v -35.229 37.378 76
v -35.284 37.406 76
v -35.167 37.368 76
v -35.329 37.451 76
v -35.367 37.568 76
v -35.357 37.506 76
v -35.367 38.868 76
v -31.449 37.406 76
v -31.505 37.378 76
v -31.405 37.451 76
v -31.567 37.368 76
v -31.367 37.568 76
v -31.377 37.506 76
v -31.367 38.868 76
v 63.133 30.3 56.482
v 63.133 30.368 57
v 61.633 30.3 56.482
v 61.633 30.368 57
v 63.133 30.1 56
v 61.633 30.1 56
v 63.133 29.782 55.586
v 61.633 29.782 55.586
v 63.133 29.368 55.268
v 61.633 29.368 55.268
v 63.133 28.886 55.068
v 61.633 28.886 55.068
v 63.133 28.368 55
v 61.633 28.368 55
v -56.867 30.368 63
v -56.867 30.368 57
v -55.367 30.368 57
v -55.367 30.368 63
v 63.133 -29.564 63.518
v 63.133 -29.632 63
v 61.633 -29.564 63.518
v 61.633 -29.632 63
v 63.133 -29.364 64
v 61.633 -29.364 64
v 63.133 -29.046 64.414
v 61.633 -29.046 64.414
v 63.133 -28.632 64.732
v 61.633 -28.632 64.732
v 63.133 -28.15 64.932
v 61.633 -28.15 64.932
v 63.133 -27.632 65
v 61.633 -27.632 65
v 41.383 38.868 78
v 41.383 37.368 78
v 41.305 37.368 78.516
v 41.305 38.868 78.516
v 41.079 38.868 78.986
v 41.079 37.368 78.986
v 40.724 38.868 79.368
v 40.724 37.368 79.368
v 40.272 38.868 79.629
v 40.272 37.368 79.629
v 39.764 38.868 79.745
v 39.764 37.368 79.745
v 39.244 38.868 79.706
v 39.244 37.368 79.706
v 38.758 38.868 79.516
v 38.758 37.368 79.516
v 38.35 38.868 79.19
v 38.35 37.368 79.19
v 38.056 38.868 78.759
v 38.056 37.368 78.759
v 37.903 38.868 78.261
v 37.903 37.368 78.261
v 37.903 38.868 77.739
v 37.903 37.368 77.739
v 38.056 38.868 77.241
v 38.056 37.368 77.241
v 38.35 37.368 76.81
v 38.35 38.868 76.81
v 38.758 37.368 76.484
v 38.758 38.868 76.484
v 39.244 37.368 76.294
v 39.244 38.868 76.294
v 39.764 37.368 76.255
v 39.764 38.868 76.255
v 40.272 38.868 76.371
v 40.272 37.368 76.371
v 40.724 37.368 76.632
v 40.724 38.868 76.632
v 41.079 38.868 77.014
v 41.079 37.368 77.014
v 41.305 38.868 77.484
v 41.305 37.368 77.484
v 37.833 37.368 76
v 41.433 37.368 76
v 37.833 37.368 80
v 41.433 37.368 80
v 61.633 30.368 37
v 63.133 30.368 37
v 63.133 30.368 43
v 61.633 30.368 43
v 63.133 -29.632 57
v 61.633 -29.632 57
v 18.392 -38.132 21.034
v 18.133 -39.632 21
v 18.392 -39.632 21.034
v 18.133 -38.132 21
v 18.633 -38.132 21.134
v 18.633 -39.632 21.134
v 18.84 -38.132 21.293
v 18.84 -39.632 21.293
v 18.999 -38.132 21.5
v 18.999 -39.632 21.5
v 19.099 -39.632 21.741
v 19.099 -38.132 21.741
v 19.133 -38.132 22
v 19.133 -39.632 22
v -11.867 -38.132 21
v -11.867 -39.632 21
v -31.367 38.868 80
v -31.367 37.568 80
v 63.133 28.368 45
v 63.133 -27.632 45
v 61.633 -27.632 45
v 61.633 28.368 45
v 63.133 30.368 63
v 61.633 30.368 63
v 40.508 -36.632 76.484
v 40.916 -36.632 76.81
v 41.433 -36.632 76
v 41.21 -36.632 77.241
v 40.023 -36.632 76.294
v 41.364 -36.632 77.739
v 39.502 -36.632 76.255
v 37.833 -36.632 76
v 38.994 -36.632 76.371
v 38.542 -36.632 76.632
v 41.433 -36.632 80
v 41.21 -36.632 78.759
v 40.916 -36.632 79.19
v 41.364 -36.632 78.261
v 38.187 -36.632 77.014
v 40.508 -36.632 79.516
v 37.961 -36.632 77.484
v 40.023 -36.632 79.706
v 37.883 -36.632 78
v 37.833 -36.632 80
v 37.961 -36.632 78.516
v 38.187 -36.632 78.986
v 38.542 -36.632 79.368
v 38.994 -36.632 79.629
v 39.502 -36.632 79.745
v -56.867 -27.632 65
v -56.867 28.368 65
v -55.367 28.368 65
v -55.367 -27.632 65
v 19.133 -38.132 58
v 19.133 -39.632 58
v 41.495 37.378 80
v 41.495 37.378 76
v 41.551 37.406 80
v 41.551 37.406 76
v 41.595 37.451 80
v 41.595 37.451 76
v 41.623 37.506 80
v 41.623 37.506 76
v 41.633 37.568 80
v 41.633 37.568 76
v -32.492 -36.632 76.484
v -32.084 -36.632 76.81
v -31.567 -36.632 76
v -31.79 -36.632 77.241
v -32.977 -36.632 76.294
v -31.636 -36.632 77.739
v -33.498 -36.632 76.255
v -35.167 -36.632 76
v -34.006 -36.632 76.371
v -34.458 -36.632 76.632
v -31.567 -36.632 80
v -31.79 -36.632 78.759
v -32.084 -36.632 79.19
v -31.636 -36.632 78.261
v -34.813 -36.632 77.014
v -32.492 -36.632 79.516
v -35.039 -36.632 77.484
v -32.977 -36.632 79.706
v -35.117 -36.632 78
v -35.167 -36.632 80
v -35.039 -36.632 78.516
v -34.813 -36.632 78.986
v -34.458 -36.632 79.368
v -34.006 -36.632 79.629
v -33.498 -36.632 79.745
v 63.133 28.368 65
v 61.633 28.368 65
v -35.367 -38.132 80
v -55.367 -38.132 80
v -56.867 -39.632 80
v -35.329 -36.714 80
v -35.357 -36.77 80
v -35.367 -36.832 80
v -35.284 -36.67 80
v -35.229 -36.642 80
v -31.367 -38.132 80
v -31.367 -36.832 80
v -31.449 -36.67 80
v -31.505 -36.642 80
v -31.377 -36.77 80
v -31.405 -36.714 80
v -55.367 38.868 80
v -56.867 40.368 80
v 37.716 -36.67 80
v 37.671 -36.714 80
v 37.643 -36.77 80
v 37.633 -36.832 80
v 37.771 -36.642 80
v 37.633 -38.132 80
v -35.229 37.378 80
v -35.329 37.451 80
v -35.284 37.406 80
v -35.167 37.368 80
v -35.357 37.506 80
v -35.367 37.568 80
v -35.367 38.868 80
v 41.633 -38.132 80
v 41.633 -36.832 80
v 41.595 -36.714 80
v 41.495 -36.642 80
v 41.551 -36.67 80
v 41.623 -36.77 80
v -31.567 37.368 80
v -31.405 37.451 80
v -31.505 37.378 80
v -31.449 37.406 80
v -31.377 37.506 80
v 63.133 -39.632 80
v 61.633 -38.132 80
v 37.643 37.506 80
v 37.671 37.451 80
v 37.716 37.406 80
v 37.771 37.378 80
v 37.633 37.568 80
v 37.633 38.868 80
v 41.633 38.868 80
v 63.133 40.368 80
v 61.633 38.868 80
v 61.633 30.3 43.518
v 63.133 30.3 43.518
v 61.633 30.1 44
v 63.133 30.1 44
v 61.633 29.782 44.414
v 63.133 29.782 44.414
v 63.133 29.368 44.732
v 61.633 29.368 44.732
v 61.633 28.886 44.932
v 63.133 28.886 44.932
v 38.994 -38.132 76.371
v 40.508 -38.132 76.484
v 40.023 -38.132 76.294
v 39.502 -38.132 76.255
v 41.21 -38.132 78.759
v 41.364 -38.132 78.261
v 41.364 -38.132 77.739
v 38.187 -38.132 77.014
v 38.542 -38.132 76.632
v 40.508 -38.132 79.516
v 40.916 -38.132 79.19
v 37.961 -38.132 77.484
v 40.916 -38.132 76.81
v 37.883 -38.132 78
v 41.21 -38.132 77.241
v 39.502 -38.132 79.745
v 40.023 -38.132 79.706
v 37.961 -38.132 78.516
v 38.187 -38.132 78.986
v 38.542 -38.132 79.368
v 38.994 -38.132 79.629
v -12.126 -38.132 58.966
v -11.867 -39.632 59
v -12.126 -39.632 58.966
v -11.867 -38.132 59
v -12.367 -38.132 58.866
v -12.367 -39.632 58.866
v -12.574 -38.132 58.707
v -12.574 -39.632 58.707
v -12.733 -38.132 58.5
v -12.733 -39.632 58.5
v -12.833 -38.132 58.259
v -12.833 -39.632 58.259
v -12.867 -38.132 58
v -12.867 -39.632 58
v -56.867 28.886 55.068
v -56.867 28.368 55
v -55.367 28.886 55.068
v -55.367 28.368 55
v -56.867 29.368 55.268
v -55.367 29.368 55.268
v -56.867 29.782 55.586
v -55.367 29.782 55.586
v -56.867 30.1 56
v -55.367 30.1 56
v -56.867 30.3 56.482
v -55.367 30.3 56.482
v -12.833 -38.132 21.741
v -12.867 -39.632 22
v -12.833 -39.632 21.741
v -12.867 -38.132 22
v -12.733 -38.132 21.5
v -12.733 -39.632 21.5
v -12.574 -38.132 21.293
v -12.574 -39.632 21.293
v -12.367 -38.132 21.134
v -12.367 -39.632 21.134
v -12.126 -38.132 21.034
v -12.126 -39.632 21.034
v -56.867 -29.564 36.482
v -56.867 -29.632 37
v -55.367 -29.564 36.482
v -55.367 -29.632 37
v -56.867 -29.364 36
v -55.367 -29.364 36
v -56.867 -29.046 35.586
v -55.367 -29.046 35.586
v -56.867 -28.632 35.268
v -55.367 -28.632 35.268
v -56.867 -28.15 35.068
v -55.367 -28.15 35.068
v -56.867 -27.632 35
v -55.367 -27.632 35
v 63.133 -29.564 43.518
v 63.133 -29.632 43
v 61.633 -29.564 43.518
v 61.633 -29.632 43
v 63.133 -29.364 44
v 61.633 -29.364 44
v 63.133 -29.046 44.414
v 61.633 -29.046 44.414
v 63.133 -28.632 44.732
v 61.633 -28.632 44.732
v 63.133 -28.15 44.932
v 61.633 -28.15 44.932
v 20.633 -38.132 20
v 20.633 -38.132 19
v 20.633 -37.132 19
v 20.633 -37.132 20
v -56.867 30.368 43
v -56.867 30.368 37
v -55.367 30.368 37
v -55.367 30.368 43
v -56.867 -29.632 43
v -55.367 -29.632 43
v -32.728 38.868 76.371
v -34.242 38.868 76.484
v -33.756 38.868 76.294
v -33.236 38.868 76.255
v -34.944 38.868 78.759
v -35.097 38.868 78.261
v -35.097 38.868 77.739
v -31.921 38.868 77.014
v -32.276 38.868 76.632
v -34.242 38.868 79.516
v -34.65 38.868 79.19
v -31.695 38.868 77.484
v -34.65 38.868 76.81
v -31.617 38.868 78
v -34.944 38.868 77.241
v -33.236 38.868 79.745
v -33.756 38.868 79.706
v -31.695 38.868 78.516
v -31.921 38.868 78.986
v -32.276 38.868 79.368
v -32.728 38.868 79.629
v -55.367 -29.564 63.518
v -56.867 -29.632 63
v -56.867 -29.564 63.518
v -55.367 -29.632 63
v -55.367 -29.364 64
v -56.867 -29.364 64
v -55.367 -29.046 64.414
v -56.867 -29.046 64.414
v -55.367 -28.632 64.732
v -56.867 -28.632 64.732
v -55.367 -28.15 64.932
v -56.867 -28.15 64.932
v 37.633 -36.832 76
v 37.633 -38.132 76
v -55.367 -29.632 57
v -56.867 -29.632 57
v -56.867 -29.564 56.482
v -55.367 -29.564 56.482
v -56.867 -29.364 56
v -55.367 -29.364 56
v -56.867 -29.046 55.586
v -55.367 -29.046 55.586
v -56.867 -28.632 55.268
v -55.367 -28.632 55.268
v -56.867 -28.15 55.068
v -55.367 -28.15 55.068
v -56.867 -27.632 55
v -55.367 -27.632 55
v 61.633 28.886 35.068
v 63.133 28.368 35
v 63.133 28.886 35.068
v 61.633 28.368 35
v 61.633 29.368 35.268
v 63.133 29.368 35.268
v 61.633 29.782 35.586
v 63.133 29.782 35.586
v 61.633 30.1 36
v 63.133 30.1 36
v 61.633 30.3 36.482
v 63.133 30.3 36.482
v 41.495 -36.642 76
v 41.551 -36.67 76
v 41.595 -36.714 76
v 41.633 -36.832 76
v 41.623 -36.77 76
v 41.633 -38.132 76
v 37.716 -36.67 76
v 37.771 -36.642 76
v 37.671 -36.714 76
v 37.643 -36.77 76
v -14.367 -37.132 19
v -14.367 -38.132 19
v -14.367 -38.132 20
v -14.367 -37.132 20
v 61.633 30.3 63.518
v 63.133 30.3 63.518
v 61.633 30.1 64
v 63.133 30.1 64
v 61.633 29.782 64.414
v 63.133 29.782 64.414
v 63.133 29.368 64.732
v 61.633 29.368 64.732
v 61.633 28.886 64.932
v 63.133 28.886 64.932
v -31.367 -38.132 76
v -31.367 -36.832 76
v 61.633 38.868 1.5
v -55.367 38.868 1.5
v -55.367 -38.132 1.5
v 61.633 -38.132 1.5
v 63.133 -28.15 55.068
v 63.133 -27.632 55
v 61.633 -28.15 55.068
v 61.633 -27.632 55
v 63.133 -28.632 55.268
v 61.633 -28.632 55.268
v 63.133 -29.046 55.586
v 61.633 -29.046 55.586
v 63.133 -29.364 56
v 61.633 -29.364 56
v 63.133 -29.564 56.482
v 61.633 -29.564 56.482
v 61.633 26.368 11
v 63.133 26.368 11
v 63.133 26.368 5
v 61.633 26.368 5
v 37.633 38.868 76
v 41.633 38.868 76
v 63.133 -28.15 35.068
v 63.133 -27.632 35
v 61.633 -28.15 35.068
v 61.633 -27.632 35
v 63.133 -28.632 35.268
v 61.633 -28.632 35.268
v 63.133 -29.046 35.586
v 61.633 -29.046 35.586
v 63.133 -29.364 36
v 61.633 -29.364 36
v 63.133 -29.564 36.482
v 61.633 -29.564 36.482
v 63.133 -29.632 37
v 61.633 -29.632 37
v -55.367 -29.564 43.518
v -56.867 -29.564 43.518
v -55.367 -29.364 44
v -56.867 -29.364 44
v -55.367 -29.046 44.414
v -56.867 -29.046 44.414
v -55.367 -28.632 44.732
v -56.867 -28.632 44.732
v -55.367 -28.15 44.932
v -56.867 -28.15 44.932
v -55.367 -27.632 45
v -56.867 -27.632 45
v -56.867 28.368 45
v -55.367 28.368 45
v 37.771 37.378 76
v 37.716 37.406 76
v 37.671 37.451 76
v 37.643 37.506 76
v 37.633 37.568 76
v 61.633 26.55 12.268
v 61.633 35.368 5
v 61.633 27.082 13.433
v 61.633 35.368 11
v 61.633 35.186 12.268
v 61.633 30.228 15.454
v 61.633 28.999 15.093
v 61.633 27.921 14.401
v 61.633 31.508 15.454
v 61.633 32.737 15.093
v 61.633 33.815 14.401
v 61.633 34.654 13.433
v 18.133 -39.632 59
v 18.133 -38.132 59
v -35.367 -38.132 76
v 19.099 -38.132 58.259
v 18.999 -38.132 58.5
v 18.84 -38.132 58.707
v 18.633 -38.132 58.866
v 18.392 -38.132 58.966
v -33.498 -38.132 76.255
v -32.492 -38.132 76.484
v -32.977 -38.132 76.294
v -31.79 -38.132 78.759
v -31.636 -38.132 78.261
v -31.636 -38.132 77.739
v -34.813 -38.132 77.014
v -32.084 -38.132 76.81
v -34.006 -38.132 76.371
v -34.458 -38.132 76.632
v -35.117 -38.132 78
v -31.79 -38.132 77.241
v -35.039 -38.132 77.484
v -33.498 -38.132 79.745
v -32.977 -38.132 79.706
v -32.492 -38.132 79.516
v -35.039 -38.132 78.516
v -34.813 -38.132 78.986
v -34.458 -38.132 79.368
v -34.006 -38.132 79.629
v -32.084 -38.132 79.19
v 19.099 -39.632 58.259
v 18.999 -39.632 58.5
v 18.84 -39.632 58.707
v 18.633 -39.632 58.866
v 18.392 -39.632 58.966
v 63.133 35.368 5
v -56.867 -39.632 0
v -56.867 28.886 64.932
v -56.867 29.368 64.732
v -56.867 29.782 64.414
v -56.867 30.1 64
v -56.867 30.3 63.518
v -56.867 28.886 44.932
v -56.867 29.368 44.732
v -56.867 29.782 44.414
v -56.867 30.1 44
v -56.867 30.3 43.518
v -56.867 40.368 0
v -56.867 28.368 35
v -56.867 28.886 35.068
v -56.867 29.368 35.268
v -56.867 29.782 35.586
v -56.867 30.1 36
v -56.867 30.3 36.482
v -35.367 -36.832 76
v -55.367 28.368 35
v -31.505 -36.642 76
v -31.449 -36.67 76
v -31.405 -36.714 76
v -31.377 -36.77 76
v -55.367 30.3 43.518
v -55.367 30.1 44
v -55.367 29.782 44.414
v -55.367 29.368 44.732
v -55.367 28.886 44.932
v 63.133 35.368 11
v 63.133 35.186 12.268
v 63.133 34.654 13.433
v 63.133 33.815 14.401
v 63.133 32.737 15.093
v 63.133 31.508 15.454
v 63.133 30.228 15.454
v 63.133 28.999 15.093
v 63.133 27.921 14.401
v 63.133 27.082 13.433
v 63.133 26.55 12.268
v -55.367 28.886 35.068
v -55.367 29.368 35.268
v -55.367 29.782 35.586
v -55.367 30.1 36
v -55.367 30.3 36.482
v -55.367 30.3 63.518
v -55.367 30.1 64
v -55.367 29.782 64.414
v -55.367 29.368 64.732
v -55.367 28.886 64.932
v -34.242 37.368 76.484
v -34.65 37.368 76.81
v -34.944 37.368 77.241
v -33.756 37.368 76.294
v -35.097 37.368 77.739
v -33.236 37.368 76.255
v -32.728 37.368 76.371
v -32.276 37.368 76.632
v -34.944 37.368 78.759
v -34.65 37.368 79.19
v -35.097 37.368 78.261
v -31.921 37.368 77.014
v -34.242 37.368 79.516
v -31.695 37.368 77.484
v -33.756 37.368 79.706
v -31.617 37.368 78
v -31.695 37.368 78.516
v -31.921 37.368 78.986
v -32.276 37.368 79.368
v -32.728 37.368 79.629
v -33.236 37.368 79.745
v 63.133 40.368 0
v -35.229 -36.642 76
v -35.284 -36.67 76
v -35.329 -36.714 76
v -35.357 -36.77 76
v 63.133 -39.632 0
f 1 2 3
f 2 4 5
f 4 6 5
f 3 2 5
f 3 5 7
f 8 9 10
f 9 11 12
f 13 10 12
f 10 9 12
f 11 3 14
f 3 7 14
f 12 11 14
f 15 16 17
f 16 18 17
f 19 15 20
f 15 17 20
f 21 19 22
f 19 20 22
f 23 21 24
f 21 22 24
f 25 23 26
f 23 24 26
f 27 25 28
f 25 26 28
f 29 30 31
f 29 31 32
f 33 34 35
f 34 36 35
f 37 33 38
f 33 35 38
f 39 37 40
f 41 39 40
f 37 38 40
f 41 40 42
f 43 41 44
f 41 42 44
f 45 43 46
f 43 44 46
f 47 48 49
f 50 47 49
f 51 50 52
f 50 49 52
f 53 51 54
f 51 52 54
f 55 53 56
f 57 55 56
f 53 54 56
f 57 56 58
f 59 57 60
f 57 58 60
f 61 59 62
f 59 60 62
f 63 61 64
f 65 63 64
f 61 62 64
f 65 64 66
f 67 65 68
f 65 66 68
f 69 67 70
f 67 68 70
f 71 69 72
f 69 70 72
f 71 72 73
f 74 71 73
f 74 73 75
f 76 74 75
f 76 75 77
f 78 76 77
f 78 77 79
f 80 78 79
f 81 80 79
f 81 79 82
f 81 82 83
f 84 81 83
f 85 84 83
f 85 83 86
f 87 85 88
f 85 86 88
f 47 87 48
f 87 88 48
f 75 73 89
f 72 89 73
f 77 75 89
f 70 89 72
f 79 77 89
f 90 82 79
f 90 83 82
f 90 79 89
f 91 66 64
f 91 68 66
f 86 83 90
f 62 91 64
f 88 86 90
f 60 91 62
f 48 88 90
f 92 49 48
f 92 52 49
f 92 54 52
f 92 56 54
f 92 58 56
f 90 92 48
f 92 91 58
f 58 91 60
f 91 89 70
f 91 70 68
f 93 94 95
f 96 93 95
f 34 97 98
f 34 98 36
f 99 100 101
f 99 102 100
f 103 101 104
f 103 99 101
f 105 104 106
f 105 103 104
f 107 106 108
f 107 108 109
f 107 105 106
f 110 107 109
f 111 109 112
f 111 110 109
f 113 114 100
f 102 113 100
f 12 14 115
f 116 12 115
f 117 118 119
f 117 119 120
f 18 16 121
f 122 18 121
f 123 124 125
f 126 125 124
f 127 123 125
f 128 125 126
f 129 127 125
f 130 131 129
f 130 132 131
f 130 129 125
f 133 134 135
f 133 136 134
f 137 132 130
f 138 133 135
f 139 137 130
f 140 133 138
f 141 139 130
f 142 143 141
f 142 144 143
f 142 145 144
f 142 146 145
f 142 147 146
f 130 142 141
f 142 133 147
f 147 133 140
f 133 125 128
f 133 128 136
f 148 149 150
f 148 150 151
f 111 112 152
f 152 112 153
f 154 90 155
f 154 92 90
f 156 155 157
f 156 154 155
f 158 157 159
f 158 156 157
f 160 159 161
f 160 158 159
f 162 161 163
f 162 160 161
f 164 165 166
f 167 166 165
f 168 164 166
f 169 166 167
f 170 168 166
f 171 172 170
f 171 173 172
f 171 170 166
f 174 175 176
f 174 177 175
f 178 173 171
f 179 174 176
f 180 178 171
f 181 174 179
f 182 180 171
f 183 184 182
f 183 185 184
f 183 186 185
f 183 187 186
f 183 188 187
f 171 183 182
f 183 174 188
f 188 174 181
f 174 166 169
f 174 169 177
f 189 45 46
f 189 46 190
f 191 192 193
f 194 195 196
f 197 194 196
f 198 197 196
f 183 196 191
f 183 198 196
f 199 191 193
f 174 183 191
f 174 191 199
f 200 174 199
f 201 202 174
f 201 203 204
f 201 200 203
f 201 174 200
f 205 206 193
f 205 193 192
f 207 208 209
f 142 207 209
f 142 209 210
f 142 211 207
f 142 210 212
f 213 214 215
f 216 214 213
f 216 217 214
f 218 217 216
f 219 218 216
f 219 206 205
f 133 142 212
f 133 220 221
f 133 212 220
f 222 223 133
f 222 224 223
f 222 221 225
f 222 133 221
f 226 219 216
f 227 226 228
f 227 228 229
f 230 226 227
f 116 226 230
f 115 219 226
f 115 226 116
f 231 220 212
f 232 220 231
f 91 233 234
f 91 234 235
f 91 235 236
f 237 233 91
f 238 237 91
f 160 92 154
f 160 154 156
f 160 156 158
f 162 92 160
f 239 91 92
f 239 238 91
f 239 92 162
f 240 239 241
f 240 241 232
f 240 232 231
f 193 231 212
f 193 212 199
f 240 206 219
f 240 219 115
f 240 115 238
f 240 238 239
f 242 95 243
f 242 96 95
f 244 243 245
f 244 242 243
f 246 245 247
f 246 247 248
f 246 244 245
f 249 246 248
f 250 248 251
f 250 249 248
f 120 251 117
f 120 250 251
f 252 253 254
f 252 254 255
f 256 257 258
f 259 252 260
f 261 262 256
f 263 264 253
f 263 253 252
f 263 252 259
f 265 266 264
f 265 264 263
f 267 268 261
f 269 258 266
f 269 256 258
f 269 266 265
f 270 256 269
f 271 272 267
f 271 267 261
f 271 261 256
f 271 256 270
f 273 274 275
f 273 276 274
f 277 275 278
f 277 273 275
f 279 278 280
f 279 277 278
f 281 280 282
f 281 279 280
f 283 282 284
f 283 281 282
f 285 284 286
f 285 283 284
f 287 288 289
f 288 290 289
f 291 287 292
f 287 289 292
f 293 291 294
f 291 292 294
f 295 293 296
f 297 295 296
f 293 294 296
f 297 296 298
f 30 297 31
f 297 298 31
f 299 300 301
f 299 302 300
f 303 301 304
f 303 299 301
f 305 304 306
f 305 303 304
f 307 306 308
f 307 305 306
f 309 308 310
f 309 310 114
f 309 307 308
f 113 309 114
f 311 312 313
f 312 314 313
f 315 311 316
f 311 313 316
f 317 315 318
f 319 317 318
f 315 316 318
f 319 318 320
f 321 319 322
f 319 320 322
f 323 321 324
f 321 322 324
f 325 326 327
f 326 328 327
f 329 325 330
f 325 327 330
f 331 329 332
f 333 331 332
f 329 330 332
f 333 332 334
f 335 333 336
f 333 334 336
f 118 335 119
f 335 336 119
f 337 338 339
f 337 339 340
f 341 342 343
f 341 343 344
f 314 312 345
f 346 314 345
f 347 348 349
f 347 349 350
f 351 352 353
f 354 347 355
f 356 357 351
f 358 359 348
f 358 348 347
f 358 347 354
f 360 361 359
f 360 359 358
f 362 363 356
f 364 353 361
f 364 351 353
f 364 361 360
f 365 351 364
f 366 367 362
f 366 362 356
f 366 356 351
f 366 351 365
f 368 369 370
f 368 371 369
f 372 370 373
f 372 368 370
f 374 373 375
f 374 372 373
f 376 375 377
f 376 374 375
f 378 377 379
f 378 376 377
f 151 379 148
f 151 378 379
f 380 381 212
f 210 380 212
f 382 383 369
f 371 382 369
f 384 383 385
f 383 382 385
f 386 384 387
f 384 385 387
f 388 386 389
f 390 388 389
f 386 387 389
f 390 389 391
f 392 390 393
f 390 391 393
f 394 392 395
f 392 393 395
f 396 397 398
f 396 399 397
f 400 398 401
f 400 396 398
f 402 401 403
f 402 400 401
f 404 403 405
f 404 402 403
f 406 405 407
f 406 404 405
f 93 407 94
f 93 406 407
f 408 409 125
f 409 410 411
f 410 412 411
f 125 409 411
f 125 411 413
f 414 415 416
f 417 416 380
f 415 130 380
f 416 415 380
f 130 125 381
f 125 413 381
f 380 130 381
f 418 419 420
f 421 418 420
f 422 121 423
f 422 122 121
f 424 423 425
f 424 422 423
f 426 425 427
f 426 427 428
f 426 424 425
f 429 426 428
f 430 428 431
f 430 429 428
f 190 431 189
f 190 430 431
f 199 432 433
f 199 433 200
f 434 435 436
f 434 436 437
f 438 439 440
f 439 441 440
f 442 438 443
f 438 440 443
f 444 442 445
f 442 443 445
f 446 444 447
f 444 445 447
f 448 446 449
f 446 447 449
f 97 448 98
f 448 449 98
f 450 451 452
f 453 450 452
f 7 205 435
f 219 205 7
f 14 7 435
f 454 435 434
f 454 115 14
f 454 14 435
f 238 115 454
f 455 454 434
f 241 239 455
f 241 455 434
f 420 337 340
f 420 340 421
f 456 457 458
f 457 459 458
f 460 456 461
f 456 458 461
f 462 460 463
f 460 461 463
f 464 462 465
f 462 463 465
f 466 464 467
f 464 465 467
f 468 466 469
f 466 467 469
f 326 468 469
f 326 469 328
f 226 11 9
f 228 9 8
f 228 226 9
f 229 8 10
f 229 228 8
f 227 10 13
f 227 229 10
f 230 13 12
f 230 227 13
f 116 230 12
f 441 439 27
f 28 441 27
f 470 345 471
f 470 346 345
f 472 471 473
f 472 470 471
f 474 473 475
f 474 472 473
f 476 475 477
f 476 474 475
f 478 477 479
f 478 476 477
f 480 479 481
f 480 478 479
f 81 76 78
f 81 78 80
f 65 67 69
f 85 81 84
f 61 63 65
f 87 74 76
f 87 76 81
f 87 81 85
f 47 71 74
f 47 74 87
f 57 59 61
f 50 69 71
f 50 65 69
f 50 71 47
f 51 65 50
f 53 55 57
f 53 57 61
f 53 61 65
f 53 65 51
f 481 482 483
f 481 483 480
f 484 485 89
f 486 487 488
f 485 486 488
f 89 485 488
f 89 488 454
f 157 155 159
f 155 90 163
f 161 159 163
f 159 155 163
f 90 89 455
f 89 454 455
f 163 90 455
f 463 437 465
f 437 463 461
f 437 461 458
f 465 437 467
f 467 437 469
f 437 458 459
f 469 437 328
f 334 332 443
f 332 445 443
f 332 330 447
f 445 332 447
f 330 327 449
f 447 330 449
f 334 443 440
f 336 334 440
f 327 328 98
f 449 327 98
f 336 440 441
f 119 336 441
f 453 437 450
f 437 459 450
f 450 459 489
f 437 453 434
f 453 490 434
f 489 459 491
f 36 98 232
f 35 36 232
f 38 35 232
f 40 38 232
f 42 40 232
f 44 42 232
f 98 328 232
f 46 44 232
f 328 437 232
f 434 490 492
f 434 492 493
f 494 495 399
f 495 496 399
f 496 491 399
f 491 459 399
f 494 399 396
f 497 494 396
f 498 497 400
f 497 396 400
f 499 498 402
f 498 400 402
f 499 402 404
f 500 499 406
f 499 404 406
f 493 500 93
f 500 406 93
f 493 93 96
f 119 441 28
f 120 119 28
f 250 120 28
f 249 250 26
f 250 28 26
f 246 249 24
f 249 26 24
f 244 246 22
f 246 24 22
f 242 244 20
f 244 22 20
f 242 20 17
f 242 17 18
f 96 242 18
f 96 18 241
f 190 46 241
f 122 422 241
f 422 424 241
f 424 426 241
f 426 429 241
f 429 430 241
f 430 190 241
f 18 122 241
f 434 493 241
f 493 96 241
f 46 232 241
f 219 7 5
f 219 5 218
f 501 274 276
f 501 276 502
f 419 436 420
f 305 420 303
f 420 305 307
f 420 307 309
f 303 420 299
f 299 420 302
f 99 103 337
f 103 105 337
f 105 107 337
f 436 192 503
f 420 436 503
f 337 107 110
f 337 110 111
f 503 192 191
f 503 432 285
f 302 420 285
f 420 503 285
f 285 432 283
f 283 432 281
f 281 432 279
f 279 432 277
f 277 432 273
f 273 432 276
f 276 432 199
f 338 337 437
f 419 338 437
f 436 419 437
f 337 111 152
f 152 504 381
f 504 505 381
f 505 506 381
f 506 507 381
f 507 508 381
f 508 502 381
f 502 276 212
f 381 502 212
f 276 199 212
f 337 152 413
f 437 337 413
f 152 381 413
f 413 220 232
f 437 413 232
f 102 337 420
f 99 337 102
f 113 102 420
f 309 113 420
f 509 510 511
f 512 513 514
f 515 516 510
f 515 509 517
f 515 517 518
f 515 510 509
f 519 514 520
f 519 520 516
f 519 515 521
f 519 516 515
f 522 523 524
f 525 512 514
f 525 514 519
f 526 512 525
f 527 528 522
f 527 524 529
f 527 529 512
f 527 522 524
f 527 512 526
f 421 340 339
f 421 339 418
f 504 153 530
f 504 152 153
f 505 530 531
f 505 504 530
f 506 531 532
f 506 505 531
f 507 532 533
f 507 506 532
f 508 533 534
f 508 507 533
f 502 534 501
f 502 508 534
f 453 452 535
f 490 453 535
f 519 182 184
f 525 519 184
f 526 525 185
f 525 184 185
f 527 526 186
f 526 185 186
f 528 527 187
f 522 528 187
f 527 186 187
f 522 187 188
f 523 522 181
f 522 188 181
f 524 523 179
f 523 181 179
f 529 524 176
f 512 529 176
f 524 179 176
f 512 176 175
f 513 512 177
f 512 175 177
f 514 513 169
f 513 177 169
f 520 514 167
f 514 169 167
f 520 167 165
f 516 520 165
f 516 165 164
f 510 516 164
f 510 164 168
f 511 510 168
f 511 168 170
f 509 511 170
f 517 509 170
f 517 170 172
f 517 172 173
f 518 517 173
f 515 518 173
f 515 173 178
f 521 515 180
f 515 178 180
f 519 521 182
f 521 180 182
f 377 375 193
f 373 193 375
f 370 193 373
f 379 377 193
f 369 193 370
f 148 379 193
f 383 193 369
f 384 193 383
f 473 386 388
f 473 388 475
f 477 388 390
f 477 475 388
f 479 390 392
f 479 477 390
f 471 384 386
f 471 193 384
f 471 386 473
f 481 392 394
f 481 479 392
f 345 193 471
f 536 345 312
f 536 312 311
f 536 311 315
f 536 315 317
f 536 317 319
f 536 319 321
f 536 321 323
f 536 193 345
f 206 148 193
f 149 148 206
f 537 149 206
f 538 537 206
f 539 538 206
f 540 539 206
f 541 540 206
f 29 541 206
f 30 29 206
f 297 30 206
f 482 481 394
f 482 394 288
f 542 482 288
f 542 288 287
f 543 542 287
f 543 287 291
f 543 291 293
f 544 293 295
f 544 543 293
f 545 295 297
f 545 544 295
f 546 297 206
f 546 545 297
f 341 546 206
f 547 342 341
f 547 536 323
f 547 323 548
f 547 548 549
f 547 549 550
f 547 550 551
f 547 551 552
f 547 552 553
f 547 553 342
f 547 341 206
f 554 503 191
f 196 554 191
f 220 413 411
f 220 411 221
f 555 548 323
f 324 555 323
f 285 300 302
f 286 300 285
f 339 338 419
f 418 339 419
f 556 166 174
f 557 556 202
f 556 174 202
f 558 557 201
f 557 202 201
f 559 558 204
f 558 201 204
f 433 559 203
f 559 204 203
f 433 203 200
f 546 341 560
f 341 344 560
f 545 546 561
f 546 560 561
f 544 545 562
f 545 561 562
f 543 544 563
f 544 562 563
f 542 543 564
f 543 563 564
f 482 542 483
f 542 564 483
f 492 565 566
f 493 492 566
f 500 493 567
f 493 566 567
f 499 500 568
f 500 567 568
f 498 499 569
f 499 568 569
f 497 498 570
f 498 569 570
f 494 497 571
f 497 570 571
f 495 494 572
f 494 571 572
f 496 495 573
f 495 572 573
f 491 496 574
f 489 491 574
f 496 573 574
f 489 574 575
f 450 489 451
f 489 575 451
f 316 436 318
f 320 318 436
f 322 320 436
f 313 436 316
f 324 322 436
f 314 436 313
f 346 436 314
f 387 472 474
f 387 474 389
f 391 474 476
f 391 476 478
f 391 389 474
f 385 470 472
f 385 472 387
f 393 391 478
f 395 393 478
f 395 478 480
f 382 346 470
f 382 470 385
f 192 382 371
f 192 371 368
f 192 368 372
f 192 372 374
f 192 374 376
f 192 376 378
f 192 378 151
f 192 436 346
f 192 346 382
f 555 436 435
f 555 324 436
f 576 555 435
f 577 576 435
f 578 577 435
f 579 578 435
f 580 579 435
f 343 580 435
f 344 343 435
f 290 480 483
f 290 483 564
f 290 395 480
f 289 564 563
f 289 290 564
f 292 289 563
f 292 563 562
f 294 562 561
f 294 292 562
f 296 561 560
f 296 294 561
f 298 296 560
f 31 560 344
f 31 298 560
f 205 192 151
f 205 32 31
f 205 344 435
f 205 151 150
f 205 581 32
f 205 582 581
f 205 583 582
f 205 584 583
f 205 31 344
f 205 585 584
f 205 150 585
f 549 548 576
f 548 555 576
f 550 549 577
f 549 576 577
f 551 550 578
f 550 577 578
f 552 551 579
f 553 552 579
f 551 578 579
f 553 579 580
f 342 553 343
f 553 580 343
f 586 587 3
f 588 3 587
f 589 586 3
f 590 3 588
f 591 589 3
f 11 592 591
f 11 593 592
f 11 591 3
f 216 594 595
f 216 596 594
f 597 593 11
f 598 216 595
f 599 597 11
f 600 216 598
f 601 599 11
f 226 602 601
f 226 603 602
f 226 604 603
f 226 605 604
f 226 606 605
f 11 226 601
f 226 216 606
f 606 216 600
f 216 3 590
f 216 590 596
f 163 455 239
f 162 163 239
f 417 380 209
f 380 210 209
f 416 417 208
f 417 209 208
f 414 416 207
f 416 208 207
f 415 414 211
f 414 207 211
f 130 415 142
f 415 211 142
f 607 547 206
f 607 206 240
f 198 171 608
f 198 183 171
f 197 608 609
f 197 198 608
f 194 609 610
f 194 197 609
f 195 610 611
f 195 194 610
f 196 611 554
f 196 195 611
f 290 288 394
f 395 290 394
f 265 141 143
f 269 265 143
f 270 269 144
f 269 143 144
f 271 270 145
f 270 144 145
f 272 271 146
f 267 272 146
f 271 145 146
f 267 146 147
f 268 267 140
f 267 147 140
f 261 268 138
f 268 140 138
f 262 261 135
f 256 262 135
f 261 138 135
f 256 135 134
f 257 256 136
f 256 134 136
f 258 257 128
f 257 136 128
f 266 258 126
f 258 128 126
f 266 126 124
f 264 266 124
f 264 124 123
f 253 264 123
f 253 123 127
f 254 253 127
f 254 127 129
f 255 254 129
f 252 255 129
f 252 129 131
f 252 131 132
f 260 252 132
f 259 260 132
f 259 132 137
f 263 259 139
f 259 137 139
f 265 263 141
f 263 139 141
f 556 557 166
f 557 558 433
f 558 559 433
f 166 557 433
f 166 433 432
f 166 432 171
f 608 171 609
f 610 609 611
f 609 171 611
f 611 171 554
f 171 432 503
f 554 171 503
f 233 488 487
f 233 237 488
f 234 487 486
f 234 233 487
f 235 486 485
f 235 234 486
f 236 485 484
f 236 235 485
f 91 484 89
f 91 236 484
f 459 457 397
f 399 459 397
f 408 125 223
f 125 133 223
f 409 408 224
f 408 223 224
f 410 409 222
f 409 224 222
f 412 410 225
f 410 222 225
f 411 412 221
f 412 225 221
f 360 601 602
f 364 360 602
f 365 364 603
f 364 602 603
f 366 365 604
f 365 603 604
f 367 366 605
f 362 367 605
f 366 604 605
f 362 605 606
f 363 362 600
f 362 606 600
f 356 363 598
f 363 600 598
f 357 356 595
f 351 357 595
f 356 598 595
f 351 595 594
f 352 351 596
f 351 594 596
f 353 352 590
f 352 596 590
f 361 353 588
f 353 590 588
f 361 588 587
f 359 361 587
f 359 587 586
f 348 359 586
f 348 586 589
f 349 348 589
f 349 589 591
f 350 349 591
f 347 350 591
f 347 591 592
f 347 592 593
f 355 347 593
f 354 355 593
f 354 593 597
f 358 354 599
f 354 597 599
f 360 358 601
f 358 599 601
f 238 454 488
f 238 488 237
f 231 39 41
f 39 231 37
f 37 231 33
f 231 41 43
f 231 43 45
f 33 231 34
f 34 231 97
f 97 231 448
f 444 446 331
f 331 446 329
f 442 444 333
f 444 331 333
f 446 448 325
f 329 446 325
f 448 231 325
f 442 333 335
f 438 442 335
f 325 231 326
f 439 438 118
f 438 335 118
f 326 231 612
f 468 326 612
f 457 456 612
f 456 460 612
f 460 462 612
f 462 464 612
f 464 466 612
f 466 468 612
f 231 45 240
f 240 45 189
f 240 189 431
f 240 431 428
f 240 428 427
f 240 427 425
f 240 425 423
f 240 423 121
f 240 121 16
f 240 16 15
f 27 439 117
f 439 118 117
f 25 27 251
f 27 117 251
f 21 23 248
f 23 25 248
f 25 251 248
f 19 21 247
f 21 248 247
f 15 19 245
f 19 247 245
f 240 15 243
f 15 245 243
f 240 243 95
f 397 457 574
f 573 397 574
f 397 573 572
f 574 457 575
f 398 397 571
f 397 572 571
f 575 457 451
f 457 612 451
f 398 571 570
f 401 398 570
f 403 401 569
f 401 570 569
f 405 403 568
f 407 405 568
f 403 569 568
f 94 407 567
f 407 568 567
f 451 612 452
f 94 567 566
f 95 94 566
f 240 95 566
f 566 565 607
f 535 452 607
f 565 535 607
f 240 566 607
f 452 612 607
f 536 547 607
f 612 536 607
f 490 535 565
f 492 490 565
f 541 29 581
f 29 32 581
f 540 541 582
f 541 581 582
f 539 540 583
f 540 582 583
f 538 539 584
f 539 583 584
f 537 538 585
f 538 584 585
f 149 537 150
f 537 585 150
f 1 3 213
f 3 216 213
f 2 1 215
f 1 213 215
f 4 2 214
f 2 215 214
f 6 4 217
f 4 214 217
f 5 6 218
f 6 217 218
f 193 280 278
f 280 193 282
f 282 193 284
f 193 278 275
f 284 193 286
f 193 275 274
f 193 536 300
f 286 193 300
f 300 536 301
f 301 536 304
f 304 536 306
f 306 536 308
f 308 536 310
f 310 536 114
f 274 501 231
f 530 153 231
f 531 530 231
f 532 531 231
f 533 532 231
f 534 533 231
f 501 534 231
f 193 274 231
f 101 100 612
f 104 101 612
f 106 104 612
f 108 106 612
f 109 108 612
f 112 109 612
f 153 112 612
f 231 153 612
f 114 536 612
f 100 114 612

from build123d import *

# Parameters (mm, degrees)
SKETCH_W        = 120
SKETCH_H        = 80
PAD_DEPTH       = 80
SKETCH001_W     = 117
SKETCH001_H     = 77
POCKET_DEPTH    = 78.5
SKETCH002_W     = 32
SKETCH002_H     = 38
POCKET001_DEPTH = 2
SKETCH003_W     = 60
SKETCH003_H     = 10
POCKET002_DEPTH = 5
SKETCH004_W     = 60
SKETCH004_H     = 10
POCKET003_DEPTH = 5
POCKET004_DEPTH = 5
SKETCH006_W     = 4
SKETCH006_H     = 4
PAD001_DEPTH    = 1.5
SKETCH007_R     = 1.75
POCKET005_DEPTH = 1.5
SKETCH008_R     = 1.75
POCKET006_DEPTH = 1.5
SKETCH009_W     = 4
SKETCH009_H     = 4
PAD002_DEPTH    = 1.5
SKETCH010_R     = 1.75
POCKET007_DEPTH = 1.5
SKETCH011_R     = 1.75
POCKET008_DEPTH = 1.5
FILLET_R        = 1
FILLET001_R     = 1
FILLET002_R     = 1
FILLET003_R     = 1
SKETCH012_W     = 35
SKETCH012_H     = 1
PAD003_DEPTH    = 1
FILLET004_R     = 0.2
FILLET005_R     = 0.2
FILLET006_R     = 0.2
FILLET007_R     = 0.2
FILLET008_R     = 0.2
FILLET009_R     = 0.2
FILLET010_R     = 0.2
FILLET011_R     = 0.2
FILLET012_R     = 2
FILLET013_R     = 2
FILLET014_R     = 2
FILLET015_R     = 2
FILLET016_R     = 2
FILLET017_R     = 2
FILLET018_R     = 2
FILLET019_R     = 2
FILLET020_R     = 2
FILLET021_R     = 2
FILLET022_R     = 2
FILLET023_R     = 2
FILLET024_R     = 2
FILLET025_R     = 2
FILLET026_R     = 2
FILLET027_R     = 2


with BuildPart() as part:
    # Sketch → Pad (new body)
    with BuildSketch(Plane.XY):
        with Locations((3.133141, 0.368083)):
            Rectangle(SKETCH_W, SKETCH_H)
    extrude(amount=PAD_DEPTH)

    # Sketch001 (on Face6 of Pad) → Pocket (cut)
    with BuildSketch(Plane.XY.offset(80)):
        with Locations((3.133141, 0.368083)):
            Rectangle(SKETCH001_W, SKETCH001_H)
    extrude(amount=-POCKET_DEPTH, mode=Mode.SUBTRACT)

    # Sketch002 (on Face6 of Pocket) → Pocket001 (cut)
    with BuildSketch(Plane.XZ.offset(39.631917)):
        with Locations((3.133141, 40)):
            Rectangle(SKETCH002_W, SKETCH002_H)
    extrude(amount=-POCKET001_DEPTH, mode=Mode.SUBTRACT)

    # Sketch003 (on Face3 of Pocket001) → Pocket002 (cut)
    with BuildSketch(Plane.YZ.offset(63.133141)):
        with Locations((0.368083, 60)):
            Rectangle(SKETCH003_W, SKETCH003_H)
        with Locations((0.368083, 40)):
            Rectangle(SKETCH003_W, SKETCH003_H)
    extrude(amount=-POCKET002_DEPTH, mode=Mode.SUBTRACT)

    # Sketch004 (on Face2 of Pocket002) → Pocket003 (cut)
    with BuildSketch(Plane(origin=(-56.866859, 0, 0), x_dir=(0, -1, 0), z_dir=(-1, 0, 0))):
        with Locations((-0.368083, 60)):
            Rectangle(SKETCH004_W, SKETCH004_H)
        with Locations((-0.368083, 40)):
            Rectangle(SKETCH004_W, SKETCH004_H)
    extrude(amount=-POCKET003_DEPTH, mode=Mode.SUBTRACT)

    # Sketch005 (on Face3 of Pocket003) → Pocket004 (cut)
    with BuildSketch(Plane.YZ.offset(63.133141)):
        with BuildLine():
            Line((26.368083, 11), (26.368083, 5))
            Line((26.368083, 5), (35.368083, 5))
            Line((35.368083, 5), (35.368083, 11))
            ThreePointArc((35.368083, 11), (30.868083, 15.5), (26.368083, 11))
        make_face()
    extrude(amount=-POCKET004_DEPTH, mode=Mode.SUBTRACT)

    # Sketch006 (on Face27 of Pocket004) → Pad001 (join)
    with BuildSketch(Plane.XZ.offset(-38.868083)):
        with Locations((-33.366859, 78)):
            Rectangle(SKETCH006_W, SKETCH006_H)
        with Locations((39.633141, 78)):
            Rectangle(SKETCH006_W, SKETCH006_H)
    extrude(amount=PAD001_DEPTH)

    # Sketch007 (on Face44 of Pad001) → Pocket005 (cut)
    with BuildSketch(Plane.XZ.offset(-37.368083)):
        with Locations((-33.366859, 78)):
            Circle(SKETCH007_R)
    extrude(amount=-POCKET005_DEPTH, mode=Mode.SUBTRACT)

    # Sketch008 (on Face45 of Pocket005) → Pocket006 (cut)
    with BuildSketch(Plane.XZ.offset(-37.368083)):
        with Locations((39.633141, 78)):
            Circle(SKETCH008_R)
    extrude(amount=-POCKET006_DEPTH, mode=Mode.SUBTRACT)

    # Sketch009 (on Face31 of Pocket006) → Pad002 (join)
    with BuildSketch(Plane(origin=(0, -38.131917, 0), x_dir=(-1, 0, 0), z_dir=(0, 1, 0))):
        with Locations((-39.633141, 78)):
            Rectangle(SKETCH009_W, SKETCH009_H)
        with Locations((33.366859, 78)):
            Rectangle(SKETCH009_W, SKETCH009_H)
    extrude(amount=PAD002_DEPTH)

    # Sketch010 (on Face54 of Pad002) → Pocket007 (cut)
    with BuildSketch(Plane(origin=(0, -36.631917, 0), x_dir=(-1, 0, 0), z_dir=(0, 1, 0))):
        with Locations((-39.633141, 78)):
            Circle(SKETCH010_R)
    extrude(amount=-POCKET007_DEPTH, mode=Mode.SUBTRACT)

    # Sketch011 (on Face55 of Pocket007) → Pocket008 (cut)
    with BuildSketch(Plane(origin=(0, -36.631917, 0), x_dir=(-1, 0, 0), z_dir=(0, 1, 0))):
        with Locations((33.366859, 78)):
            Circle(SKETCH011_R)
    extrude(amount=-POCKET008_DEPTH, mode=Mode.SUBTRACT)

    # Fillet
    fillet_edges = [part.edges().sort_by_distance(p)[0] for p in [
        (-12.866859, -38.881917, 21),
    ]]
    fillet(fillet_edges, radius=FILLET_R)

    # Fillet001
    fillet001_edges = [part.edges().sort_by_distance(p)[0] for p in [
        (19.133141, -38.881917, 21),
    ]]
    fillet(fillet001_edges, radius=FILLET001_R)

    # Fillet002
    fillet002_edges = [part.edges().sort_by_distance(p)[0] for p in [
        (19.133141, -38.881917, 59),
    ]]
    fillet(fillet002_edges, radius=FILLET002_R)

    # Fillet003
    fillet003_edges = [part.edges().sort_by_distance(p)[0] for p in [
        (-12.866859, -38.881917, 59),
    ]]
    fillet(fillet003_edges, radius=FILLET003_R)

    # Sketch012 (on Face14 of Fillet003) → Pad003 (join)
    with BuildSketch(Plane(origin=(0, -38.131917, 0), x_dir=(-1, 0, 0), z_dir=(0, 1, 0))):
        with Locations((-3.133141, 19.5)):
            Rectangle(SKETCH012_W, SKETCH012_H)
    extrude(amount=PAD003_DEPTH)

    # Fillet004
    fillet004_edges = [part.edges().sort_by_distance(p)[0] for p in [
        (-35.366859, -36.631917, 78),
    ]]
    fillet(fillet004_edges, radius=FILLET004_R)

    # Fillet005
    fillet005_edges = [part.edges().sort_by_distance(p)[0] for p in [
        (-31.366859, -36.631917, 78),
    ]]
    fillet(fillet005_edges, radius=FILLET005_R)

    # Fillet006
    fillet006_edges = [part.edges().sort_by_distance(p)[0] for p in [
        (37.633141, -36.631917, 78),
    ]]
    fillet(fillet006_edges, radius=FILLET006_R)

    # Fillet007
    fillet007_edges = [part.edges().sort_by_distance(p)[0] for p in [
        (41.633141, -36.631917, 78),
    ]]
    fillet(fillet007_edges, radius=FILLET007_R)

    # Fillet008
    fillet008_edges = [part.edges().sort_by_distance(p)[0] for p in [
        (-35.366859, 37.368083, 78),
    ]]
    fillet(fillet008_edges, radius=FILLET008_R)

    # Fillet009
    fillet009_edges = [part.edges().sort_by_distance(p)[0] for p in [
        (-31.366859, 37.368083, 78),
    ]]
    fillet(fillet009_edges, radius=FILLET009_R)

    # Fillet010
    fillet010_edges = [part.edges().sort_by_distance(p)[0] for p in [
        (37.633141, 37.368083, 78),
    ]]
    fillet(fillet010_edges, radius=FILLET010_R)

    # Fillet011
    fillet011_edges = [part.edges().sort_by_distance(p)[0] for p in [
        (41.633141, 37.368083, 78),
    ]]
    fillet(fillet011_edges, radius=FILLET011_R)

    # Fillet012
    fillet012_edges = [part.edges().sort_by_distance(p)[0] for p in [
        (62.383141, 30.368083, 65),
    ]]
    fillet(fillet012_edges, radius=FILLET012_R)

    # Fillet013
    fillet013_edges = [part.edges().sort_by_distance(p)[0] for p in [
        (62.383141, 30.368083, 55),
    ]]
    fillet(fillet013_edges, radius=FILLET013_R)

    # Fillet014
    fillet014_edges = [part.edges().sort_by_distance(p)[0] for p in [
        (62.383141, 30.368083, 35),
    ]]
    fillet(fillet014_edges, radius=FILLET014_R)

    # Fillet015
    fillet015_edges = [part.edges().sort_by_distance(p)[0] for p in [
        (62.383141, 30.368083, 45),
    ]]
    fillet(fillet015_edges, radius=FILLET015_R)

    # Fillet016
    fillet016_edges = [part.edges().sort_by_distance(p)[0] for p in [
        (62.383141, -29.631917, 35),
    ]]
    fillet(fillet016_edges, radius=FILLET016_R)

    # Fillet017
    fillet017_edges = [part.edges().sort_by_distance(p)[0] for p in [
        (62.383141, -29.631917, 55),
    ]]
    fillet(fillet017_edges, radius=FILLET017_R)

    # Fillet018
    fillet018_edges = [part.edges().sort_by_distance(p)[0] for p in [
        (62.383141, -29.631917, 45),
    ]]
    fillet(fillet018_edges, radius=FILLET018_R)

    # Fillet019
    fillet019_edges = [part.edges().sort_by_distance(p)[0] for p in [
        (62.383141, -29.631917, 65),
    ]]
    fillet(fillet019_edges, radius=FILLET019_R)

    # Fillet020
    fillet020_edges = [part.edges().sort_by_distance(p)[0] for p in [
        (-56.116859, -29.631917, 55),
    ]]
    fillet(fillet020_edges, radius=FILLET020_R)

    # Fillet021
    fillet021_edges = [part.edges().sort_by_distance(p)[0] for p in [
        (-56.116859, -29.631917, 35),
    ]]
    fillet(fillet021_edges, radius=FILLET021_R)

    # Fillet022
    fillet022_edges = [part.edges().sort_by_distance(p)[0] for p in [
        (-56.116859, -29.631917, 45),
    ]]
    fillet(fillet022_edges, radius=FILLET022_R)

    # Fillet023
    fillet023_edges = [part.edges().sort_by_distance(p)[0] for p in [
        (-56.116859, -29.631917, 65),
    ]]
    fillet(fillet023_edges, radius=FILLET023_R)

    # Fillet024
    fillet024_edges = [part.edges().sort_by_distance(p)[0] for p in [
        (-56.116859, 30.368083, 55),
    ]]
    fillet(fillet024_edges, radius=FILLET024_R)

    # Fillet025
    fillet025_edges = [part.edges().sort_by_distance(p)[0] for p in [
        (-56.116859, 30.368083, 35),
    ]]
    fillet(fillet025_edges, radius=FILLET025_R)

    # Fillet026
    fillet026_edges = [part.edges().sort_by_distance(p)[0] for p in [
        (-56.116859, 30.368083, 65),
    ]]
    fillet(fillet026_edges, radius=FILLET026_R)

    # Fillet027
    fillet027_edges = [part.edges().sort_by_distance(p)[0] for p in [
        (-56.116859, 30.368083, 45),
    ]]
    fillet(fillet027_edges, radius=FILLET027_R)


solid = part.part
